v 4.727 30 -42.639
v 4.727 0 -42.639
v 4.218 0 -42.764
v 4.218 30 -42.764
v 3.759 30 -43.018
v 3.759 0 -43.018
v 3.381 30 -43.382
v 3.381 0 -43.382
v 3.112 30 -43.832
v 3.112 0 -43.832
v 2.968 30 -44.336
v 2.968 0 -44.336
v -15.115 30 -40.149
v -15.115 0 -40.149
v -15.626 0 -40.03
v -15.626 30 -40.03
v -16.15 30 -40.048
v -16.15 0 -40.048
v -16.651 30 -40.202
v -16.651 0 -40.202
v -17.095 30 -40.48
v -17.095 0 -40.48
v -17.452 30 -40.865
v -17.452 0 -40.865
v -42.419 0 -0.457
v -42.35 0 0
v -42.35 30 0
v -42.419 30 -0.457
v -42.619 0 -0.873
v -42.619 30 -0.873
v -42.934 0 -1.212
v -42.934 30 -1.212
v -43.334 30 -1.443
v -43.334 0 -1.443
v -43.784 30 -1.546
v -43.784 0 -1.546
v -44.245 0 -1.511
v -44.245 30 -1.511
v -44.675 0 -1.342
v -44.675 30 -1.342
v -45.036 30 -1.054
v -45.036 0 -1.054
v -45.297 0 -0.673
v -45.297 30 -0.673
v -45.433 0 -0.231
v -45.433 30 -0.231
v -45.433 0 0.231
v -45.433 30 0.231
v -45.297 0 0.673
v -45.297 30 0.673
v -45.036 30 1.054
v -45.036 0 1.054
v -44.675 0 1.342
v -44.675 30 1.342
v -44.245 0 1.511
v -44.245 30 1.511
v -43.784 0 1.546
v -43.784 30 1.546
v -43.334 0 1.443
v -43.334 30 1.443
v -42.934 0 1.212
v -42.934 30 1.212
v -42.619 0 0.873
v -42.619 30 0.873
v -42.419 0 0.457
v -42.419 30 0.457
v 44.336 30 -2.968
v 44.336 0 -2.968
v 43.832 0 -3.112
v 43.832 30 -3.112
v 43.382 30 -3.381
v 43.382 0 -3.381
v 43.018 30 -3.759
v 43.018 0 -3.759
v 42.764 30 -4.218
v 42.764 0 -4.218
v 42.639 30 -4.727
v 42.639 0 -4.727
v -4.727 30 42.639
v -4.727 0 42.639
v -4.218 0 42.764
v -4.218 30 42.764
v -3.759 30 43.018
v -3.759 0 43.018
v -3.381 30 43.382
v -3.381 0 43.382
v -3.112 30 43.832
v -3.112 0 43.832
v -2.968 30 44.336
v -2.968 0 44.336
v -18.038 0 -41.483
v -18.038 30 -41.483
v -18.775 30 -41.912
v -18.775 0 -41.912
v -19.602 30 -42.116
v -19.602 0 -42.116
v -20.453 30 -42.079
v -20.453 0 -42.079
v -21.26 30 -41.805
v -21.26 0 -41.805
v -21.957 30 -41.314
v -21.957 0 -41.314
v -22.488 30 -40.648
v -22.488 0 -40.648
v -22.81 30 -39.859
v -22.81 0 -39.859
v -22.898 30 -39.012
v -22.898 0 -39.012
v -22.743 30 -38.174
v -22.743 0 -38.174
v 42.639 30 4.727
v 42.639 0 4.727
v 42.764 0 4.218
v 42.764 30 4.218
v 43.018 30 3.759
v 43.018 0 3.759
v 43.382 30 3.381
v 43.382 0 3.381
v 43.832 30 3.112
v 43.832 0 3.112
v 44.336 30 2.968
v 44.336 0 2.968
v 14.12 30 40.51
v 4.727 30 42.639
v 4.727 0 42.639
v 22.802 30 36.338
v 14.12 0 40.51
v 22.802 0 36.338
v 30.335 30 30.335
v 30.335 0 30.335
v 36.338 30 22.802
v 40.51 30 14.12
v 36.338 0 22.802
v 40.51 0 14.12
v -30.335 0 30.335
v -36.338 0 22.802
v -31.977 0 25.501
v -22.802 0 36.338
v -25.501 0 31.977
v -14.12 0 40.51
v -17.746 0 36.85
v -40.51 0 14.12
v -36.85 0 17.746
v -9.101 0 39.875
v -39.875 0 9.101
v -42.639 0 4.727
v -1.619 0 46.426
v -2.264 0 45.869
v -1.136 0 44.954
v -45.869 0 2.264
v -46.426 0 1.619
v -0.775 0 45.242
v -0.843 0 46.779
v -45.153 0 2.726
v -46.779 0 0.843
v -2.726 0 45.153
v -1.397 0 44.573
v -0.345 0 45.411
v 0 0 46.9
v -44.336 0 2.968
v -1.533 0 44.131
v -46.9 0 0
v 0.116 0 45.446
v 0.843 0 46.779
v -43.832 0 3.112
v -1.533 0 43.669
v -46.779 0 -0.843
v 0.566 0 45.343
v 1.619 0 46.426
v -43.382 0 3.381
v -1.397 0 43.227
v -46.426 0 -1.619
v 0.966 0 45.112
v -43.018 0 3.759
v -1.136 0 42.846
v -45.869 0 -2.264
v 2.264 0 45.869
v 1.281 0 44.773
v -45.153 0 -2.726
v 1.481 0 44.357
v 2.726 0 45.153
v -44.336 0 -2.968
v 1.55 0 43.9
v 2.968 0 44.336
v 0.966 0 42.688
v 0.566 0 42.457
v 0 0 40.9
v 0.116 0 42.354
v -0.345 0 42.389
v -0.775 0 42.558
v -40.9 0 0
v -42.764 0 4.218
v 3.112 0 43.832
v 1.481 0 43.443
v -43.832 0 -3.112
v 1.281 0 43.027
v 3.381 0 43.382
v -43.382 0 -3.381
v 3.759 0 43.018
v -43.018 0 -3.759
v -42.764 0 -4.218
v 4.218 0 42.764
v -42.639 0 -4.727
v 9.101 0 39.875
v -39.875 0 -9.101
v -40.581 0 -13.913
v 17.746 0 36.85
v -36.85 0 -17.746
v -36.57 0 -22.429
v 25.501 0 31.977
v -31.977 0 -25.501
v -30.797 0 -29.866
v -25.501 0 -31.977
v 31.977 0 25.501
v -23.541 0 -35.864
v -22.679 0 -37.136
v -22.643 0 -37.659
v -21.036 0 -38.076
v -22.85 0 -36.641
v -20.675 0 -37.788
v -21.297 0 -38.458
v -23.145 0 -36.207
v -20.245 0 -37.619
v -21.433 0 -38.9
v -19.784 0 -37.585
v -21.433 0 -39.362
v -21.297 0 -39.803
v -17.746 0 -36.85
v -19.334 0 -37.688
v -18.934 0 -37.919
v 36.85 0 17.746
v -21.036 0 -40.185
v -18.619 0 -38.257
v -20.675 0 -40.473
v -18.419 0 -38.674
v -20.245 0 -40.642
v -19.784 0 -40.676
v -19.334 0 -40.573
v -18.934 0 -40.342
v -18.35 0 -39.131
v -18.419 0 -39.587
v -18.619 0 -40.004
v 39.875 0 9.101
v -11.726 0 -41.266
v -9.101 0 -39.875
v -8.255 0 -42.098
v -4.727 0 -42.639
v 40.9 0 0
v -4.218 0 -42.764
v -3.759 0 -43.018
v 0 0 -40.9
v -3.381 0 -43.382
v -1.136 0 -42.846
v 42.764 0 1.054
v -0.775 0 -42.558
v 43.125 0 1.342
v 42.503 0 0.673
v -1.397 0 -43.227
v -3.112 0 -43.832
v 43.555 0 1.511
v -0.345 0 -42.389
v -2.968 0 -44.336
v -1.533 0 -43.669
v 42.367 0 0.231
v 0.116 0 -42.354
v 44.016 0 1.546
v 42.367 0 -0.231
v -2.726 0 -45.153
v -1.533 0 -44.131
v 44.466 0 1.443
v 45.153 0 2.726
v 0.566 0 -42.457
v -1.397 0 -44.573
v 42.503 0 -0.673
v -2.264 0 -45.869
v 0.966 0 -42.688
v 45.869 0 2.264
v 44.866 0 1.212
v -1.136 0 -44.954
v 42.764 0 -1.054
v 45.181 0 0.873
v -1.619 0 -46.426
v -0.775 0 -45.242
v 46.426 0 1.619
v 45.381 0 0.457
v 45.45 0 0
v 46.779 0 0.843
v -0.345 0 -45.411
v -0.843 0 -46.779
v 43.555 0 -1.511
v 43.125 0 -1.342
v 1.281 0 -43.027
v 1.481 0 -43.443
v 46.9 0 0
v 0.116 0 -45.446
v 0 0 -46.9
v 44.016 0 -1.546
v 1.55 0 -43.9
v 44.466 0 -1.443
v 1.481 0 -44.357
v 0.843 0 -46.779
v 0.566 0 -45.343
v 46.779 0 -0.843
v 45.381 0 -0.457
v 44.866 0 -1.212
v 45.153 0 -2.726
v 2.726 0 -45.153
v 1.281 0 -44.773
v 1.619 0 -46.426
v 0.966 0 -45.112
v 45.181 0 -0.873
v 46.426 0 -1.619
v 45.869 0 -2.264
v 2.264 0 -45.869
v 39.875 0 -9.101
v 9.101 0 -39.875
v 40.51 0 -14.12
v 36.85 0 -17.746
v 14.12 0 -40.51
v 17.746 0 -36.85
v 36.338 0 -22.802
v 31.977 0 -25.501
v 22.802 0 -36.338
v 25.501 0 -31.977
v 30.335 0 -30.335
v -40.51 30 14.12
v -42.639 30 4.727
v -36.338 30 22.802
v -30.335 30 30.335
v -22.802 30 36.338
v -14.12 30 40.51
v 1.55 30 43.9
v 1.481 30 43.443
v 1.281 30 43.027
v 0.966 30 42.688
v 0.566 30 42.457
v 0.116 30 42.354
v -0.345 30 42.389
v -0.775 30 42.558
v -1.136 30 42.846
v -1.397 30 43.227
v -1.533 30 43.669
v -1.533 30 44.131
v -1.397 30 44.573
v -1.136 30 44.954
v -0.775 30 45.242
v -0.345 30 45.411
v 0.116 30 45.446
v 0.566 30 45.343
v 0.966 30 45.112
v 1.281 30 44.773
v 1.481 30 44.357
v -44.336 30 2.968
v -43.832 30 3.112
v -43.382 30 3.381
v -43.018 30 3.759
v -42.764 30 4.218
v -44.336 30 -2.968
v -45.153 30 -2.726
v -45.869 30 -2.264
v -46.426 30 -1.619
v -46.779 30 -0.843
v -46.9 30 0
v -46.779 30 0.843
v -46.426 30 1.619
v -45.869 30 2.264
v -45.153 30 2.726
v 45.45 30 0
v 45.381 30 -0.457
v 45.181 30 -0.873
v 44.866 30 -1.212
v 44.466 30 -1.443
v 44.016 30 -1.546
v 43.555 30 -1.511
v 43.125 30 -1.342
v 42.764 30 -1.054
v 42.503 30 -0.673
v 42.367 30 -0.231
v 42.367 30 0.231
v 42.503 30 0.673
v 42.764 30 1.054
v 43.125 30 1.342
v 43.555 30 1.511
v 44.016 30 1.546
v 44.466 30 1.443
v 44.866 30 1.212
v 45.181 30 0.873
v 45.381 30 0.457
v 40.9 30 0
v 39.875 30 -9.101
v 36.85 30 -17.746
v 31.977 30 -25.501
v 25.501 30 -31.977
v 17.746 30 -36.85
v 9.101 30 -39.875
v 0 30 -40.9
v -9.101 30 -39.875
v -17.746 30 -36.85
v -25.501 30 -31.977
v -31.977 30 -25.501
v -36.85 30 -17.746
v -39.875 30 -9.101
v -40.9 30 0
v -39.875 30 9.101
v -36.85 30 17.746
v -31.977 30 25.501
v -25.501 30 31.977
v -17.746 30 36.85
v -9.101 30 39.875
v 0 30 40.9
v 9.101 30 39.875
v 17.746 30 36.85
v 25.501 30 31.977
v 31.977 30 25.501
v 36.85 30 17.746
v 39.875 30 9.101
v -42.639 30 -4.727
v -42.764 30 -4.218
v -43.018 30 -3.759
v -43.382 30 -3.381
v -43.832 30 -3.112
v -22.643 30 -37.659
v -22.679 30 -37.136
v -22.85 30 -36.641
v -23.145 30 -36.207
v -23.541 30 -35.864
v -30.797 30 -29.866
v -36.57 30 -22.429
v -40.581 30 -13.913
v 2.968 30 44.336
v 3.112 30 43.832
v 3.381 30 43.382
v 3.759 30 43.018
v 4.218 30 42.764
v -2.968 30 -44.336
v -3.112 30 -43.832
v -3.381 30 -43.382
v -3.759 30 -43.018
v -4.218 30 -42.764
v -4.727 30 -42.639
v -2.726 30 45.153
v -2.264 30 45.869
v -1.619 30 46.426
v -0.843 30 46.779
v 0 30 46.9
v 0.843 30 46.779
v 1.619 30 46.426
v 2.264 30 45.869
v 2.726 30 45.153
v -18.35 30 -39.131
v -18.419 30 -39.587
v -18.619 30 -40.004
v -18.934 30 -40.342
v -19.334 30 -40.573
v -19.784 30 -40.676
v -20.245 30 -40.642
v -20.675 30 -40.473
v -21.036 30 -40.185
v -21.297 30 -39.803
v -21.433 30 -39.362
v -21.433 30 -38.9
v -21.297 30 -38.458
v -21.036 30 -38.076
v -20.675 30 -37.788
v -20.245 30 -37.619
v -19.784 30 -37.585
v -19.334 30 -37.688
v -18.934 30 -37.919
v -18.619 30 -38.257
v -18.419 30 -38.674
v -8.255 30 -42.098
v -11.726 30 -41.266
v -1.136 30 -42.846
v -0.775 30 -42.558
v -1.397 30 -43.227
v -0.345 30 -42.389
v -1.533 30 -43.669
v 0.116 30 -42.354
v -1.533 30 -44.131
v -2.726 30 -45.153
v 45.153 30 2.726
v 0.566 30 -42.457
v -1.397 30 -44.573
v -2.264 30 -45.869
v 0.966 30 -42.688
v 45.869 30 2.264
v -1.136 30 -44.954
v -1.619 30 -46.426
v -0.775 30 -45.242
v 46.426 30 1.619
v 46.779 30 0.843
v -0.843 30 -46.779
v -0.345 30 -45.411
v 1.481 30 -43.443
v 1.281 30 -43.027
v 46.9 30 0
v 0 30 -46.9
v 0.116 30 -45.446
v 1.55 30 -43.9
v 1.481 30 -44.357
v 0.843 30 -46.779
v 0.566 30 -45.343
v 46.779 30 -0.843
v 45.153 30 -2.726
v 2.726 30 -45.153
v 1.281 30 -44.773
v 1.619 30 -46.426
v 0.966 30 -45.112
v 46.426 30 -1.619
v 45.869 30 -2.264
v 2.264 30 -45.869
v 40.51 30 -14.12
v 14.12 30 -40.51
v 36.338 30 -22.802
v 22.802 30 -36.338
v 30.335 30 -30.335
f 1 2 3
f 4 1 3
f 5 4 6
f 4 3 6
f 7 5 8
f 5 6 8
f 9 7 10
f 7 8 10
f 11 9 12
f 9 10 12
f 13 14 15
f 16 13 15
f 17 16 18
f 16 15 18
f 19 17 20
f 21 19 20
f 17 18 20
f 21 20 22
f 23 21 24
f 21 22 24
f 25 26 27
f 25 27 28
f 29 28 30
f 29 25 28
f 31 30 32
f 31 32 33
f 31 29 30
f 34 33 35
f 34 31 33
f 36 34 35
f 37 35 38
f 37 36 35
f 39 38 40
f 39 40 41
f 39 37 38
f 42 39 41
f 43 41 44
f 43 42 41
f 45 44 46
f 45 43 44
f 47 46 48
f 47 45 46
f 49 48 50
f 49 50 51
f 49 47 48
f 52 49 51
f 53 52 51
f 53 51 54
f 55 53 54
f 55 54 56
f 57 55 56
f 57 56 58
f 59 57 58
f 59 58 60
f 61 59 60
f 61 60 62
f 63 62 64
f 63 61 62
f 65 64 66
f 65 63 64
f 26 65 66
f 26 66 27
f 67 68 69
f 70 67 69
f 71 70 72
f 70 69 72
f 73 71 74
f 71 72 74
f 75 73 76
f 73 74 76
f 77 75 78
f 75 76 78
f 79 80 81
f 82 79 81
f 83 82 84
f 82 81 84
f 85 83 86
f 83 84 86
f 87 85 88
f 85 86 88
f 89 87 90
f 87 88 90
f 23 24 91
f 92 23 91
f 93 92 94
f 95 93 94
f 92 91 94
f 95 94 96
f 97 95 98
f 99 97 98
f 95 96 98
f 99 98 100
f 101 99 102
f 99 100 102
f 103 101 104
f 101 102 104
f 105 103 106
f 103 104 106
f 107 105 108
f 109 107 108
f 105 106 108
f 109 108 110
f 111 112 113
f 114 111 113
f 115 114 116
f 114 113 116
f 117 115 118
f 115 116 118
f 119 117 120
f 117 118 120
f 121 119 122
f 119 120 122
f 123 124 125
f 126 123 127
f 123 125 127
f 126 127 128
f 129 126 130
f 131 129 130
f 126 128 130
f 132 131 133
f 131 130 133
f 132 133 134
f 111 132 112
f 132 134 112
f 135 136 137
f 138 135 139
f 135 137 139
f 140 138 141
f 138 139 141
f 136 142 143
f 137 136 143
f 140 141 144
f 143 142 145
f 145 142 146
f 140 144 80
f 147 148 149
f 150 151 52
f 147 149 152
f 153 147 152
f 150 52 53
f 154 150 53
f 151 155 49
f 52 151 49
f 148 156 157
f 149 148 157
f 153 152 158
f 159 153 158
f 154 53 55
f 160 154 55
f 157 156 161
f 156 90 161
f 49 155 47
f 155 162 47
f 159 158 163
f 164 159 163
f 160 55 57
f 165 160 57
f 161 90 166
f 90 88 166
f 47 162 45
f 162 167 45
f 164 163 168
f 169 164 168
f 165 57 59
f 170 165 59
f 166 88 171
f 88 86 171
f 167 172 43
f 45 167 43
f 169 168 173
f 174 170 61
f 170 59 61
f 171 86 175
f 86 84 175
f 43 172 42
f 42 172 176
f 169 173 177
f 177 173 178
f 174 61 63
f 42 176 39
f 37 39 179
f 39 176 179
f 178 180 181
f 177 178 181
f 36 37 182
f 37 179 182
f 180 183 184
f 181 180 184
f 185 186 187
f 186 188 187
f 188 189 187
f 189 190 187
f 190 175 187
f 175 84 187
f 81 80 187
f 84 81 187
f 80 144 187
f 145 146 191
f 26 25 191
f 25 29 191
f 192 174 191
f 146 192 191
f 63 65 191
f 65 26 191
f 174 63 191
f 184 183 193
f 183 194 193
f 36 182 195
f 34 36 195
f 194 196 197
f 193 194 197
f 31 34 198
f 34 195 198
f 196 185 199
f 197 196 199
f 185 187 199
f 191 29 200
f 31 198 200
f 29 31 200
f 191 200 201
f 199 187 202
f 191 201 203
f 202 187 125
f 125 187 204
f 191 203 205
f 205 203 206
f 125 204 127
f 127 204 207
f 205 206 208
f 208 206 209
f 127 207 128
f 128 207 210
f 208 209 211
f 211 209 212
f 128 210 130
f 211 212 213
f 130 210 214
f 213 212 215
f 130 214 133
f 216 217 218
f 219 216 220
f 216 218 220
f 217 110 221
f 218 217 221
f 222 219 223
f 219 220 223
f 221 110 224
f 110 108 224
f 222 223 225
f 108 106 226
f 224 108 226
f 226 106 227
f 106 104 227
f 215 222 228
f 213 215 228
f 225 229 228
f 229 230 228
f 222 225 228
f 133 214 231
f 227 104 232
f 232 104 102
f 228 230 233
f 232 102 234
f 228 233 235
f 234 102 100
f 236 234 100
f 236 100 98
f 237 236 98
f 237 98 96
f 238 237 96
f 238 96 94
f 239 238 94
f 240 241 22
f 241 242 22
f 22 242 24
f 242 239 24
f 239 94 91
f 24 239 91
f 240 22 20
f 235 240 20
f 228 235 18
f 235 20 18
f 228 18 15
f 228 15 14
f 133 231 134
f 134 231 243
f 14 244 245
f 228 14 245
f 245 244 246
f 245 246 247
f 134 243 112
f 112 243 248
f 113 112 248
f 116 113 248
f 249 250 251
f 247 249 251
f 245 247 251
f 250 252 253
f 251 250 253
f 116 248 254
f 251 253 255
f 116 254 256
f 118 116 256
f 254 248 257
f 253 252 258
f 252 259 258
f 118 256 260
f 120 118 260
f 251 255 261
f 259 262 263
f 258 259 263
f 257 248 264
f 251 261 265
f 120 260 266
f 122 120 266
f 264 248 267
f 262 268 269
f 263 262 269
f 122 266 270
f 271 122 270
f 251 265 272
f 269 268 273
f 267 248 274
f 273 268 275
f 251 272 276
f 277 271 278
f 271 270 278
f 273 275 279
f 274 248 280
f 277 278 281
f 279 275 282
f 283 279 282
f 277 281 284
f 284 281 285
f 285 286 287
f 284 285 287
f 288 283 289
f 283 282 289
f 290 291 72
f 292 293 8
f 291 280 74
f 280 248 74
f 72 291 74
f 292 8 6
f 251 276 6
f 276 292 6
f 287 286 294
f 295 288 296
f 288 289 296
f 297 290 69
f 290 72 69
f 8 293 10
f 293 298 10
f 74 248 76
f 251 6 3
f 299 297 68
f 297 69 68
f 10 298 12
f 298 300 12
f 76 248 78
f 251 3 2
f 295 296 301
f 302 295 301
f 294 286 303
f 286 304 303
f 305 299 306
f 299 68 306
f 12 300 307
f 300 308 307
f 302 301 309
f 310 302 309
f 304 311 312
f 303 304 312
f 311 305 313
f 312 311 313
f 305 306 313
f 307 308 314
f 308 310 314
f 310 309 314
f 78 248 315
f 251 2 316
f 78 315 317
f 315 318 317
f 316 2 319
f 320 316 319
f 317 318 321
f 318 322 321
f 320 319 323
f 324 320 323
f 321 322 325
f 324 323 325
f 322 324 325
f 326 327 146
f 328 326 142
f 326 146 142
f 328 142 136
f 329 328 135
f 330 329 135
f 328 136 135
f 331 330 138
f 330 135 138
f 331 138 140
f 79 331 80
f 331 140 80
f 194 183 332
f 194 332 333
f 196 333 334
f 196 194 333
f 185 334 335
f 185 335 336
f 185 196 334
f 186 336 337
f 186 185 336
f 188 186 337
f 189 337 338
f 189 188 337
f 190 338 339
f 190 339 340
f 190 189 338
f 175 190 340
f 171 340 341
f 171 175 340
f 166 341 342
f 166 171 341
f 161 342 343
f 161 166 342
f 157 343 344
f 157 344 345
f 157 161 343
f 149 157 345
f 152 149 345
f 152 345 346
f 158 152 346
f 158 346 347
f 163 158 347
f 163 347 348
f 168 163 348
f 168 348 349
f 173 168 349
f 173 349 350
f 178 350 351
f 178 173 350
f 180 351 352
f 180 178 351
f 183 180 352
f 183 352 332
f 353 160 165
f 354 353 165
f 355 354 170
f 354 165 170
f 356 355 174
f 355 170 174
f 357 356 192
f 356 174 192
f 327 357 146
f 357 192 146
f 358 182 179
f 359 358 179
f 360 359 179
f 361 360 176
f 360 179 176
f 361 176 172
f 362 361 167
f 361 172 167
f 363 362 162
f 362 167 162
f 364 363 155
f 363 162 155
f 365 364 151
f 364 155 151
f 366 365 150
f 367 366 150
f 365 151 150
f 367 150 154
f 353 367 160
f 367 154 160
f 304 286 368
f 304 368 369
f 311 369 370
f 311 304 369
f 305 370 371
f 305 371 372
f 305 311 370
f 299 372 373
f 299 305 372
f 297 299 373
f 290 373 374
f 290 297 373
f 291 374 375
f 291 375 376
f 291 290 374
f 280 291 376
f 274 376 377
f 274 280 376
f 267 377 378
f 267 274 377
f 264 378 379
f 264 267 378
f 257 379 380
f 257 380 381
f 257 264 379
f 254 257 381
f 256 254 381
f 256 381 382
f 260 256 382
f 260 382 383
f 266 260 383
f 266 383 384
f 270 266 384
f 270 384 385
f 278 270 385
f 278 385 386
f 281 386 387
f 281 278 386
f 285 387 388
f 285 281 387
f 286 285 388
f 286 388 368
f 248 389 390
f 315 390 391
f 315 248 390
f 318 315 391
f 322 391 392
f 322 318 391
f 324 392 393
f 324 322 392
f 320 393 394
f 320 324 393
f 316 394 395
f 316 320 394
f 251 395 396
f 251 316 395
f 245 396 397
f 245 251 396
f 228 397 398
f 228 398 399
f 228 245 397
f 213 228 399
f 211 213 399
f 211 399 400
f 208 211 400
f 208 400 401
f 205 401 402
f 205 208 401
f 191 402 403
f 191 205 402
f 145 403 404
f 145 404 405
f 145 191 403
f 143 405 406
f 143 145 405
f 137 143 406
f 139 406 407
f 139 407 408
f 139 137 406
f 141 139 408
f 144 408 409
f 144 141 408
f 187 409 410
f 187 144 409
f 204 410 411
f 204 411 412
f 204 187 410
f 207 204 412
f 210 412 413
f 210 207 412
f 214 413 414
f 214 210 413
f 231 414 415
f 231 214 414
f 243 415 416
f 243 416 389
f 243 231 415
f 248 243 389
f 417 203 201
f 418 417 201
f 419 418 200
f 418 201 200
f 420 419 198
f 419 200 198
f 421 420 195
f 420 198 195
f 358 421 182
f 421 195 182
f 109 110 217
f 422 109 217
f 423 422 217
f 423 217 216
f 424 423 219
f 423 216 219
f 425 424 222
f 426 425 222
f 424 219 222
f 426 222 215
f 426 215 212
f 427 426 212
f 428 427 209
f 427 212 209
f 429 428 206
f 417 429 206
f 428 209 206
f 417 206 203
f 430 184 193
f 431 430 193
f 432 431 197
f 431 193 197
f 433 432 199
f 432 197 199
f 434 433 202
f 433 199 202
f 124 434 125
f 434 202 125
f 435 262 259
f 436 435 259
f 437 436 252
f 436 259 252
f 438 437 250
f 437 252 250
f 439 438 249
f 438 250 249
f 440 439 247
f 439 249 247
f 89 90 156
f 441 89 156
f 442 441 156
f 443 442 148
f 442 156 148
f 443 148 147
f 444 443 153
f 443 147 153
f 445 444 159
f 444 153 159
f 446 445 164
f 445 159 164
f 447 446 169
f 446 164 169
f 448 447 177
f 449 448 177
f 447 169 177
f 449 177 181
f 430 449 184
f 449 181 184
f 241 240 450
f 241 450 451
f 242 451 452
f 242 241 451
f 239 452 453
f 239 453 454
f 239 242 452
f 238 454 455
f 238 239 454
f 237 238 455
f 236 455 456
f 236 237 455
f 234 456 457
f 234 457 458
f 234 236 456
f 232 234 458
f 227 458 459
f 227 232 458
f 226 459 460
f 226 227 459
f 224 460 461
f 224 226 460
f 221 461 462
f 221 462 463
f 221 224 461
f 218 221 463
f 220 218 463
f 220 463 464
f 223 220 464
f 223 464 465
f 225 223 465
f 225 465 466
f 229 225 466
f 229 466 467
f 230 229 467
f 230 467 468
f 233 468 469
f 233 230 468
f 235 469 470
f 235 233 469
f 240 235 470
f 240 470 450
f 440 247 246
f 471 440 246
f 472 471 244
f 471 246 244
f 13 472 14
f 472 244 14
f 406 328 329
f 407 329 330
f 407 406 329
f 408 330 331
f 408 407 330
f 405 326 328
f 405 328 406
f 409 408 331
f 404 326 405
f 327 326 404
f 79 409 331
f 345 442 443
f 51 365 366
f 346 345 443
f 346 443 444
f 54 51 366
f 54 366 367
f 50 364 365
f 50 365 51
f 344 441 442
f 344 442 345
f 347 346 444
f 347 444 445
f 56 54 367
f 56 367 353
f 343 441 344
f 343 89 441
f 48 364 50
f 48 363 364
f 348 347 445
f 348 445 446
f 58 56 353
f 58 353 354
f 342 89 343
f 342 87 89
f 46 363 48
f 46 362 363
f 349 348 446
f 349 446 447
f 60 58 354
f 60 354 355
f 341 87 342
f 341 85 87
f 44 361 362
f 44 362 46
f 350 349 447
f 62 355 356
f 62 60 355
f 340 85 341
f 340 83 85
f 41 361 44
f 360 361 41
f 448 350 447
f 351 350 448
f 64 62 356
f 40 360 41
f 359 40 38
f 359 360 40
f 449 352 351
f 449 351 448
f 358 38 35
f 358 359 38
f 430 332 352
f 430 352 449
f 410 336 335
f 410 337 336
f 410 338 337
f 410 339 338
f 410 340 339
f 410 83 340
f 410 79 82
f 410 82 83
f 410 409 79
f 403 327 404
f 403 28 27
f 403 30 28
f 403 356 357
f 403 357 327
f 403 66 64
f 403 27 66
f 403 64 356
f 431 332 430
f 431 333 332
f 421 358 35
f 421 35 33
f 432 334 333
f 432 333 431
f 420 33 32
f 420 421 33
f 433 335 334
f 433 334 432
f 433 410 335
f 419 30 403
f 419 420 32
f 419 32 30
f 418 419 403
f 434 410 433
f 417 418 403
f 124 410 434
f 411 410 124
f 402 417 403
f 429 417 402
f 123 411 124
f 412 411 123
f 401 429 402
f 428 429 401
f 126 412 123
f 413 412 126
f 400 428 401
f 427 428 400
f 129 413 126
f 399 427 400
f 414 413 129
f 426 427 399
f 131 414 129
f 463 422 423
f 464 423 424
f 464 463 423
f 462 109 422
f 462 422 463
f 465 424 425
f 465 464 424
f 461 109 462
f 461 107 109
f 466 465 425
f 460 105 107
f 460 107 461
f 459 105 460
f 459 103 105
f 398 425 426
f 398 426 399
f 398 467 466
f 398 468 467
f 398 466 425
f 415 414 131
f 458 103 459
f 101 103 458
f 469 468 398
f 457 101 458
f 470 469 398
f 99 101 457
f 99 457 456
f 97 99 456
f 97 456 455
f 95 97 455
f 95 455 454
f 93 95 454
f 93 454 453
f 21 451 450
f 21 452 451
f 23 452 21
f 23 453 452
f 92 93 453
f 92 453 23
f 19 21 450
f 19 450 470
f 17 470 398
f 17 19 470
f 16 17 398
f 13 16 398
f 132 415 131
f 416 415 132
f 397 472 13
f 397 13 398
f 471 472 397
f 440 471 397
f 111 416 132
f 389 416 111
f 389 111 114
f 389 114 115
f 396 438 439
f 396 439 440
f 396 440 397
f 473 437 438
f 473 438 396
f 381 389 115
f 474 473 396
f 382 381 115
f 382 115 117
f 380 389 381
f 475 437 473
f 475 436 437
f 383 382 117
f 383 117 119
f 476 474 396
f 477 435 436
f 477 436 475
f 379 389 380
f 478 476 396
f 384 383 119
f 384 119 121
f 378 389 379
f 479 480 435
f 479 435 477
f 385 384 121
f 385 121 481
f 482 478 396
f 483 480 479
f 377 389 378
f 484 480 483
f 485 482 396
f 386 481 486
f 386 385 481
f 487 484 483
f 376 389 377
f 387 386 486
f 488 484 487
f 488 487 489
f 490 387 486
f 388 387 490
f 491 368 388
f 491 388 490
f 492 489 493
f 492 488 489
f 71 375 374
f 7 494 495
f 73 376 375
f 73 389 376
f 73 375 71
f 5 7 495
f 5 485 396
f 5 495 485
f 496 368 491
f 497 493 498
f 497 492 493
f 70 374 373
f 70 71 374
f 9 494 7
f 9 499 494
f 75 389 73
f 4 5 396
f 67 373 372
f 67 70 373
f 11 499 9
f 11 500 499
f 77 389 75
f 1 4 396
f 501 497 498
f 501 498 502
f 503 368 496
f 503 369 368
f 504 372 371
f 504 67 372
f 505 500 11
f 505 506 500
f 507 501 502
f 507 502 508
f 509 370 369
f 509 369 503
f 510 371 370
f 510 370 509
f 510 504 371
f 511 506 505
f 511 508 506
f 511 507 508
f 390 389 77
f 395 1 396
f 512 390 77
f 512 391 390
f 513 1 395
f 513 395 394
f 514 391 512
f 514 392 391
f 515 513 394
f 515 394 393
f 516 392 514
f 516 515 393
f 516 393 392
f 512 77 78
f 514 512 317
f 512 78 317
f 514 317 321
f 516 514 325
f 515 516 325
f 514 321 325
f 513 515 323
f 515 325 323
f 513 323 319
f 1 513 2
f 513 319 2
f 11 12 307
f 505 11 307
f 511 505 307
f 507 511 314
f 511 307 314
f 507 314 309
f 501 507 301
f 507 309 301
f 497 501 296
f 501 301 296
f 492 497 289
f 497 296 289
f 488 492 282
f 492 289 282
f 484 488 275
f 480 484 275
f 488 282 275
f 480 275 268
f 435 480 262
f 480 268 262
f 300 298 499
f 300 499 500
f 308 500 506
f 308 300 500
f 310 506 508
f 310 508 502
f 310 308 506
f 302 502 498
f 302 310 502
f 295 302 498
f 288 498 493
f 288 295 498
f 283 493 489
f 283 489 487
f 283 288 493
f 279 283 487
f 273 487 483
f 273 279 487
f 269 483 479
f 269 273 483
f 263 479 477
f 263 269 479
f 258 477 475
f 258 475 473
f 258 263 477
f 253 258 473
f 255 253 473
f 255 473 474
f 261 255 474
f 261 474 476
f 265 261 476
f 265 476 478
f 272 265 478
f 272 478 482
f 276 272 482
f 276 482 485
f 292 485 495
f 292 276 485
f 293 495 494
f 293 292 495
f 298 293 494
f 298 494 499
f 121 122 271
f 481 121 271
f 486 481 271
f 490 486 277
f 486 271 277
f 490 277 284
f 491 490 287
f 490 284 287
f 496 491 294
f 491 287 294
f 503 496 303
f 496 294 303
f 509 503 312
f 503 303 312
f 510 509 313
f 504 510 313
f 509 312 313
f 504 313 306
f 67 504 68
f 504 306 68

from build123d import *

# Parameters (mm, degrees)
SKETCH_1_R      = 40.9
SKETCH_1_R_2    = 1.55
EXTRUDE_1_DEPTH = 30


with BuildPart() as part:
    # 草图1 → 凸台-拉伸1 (new body)
    with BuildSketch(Plane(origin=(0, 0, 0), x_dir=(1, 0, 0), z_dir=(0, 1, 0))):
        with BuildLine():
            ThreePointArc((2.968149583, 44.335990888), (0, 46.9), (-2.968149583, 44.335990888))
            ThreePointArc((-2.968149583, 44.335990888), (-3.557987573, 43.187596963), (-4.726563367, 42.638827361))
            ThreePointArc((-4.726563367, 42.638827361), (-9.998714121, 41.718529647), (-15.115253688, 40.148961455))
            ThreePointArc((-15.115253688, 40.148961455), (-16.405630214, 40.108391944), (-17.451956512, 40.864645036))
            ThreePointArc((-17.451956512, 40.864645036), (-21.259908884, 41.80462025), (-22.74331541, 38.173703045))
            ThreePointArc((-22.74331541, 38.173703045), (-22.748500974, 36.882699338), (-23.541359728, 35.863831114))
            ThreePointArc((-23.541359728, 35.863831114), (-36.569613773, 22.429296657), (-42.638827361, 4.726563367))
            ThreePointArc((-42.638827361, 4.726563367), (-43.187596963, 3.557987573), (-44.335990888, 2.968149583))
            ThreePointArc((-44.335990888, 2.968149583), (-46.9, 0), (-44.335990888, -2.968149583))
            ThreePointArc((-44.335990888, -2.968149583), (-43.187596963, -3.557987573), (-42.638827361, -4.726563367))
            ThreePointArc((-42.638827361, -4.726563367), (-30.334880913, -30.334880913), (-4.726563367, -42.638827361))
            ThreePointArc((-4.726563367, -42.638827361), (-3.557987573, -43.187596963), (-2.968149583, -44.335990888))
            ThreePointArc((-2.968149583, -44.335990888), (0, -46.9), (2.968149583, -44.335990888))
            ThreePointArc((2.968149583, -44.335990888), (3.557987573, -43.187596963), (4.726563367, -42.638827361))
            ThreePointArc((4.726563367, -42.638827361), (30.334880913, -30.334880913), (42.638827361, -4.726563367))
            ThreePointArc((42.638827361, -4.726563367), (43.187596963, -3.557987573), (44.335990888, -2.968149583))
            ThreePointArc((44.335990888, -2.968149583), (46.9, 0), (44.335990888, 2.968149583))
            ThreePointArc((44.335990888, 2.968149583), (43.187596963, 3.557987573), (42.638827361, 4.726563367))
            ThreePointArc((42.638827361, 4.726563367), (30.334880913, 30.334880913), (4.726563367, 42.638827361))
            ThreePointArc((4.726563367, 42.638827361), (3.557987573, 43.187596963), (2.968149583, 44.335990888))
        make_face()
        Circle(SKETCH_1_R, mode=Mode.SUBTRACT)
        with Locations((0, 43.9)):
            Circle(SKETCH_1_R_2, mode=Mode.SUBTRACT)
        with Locations((43.9, 0)):
            Circle(SKETCH_1_R_2, mode=Mode.SUBTRACT)
        with Locations((0, -43.9)):
            Circle(SKETCH_1_R_2, mode=Mode.SUBTRACT)
        with Locations((-43.9, 0)):
            Circle(SKETCH_1_R_2, mode=Mode.SUBTRACT)
        with Locations((-19.9, 39.130550724)):
            Circle(SKETCH_1_R_2, mode=Mode.SUBTRACT)
    extrude(amount=EXTRUDE_1_DEPTH)


solid = part.part
